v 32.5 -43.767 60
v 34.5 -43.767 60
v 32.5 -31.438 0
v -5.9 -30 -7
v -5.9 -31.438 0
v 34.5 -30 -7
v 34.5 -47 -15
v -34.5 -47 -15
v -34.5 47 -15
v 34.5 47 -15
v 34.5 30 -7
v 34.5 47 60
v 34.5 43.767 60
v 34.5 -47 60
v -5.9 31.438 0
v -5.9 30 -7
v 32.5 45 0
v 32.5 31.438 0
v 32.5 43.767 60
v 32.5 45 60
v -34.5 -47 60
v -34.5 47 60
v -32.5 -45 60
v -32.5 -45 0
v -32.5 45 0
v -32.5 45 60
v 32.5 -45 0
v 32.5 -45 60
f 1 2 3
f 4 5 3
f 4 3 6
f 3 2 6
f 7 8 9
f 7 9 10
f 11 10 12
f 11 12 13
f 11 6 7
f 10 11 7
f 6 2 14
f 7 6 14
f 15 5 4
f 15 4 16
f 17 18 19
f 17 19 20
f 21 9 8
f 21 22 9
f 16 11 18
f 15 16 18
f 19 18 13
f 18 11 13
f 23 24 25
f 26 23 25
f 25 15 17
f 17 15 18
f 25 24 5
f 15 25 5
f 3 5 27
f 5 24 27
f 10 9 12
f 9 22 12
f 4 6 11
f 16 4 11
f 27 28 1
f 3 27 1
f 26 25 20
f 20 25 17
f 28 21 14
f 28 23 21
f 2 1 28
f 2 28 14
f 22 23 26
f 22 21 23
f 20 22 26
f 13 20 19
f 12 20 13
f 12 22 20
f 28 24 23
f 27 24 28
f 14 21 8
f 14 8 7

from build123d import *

# Parameters (mm, degrees)
F0_W     = 69
F0_H     = 94
F0_W_2   = 65
F0_H_2   = 90
F1_DEPTH = 60
F2_W     = 69
F2_H     = 94
F3_DEPTH = 15
F5_DEPTH = 40.4


with BuildPart() as f1:
    # F0 (on Top) → F1 (new body)
    with BuildSketch(Plane.XY):
        Rectangle(F0_W, F0_H)
        Rectangle(F0_W_2, F0_H_2, mode=Mode.SUBTRACT)
    extrude(amount=F1_DEPTH)

    # F2 (on face) → F3 (join)
    with BuildSketch(Plane(origin=(0, 0, 0), x_dir=(1, 0, 0), z_dir=(0, 0, -1))):
        Rectangle(F2_W, F2_H)
    extrude(amount=F3_DEPTH)

    # F4 (on face) → F5 (cut)
    with BuildSketch(Plane.YZ.offset(34.5)):
        Polygon((-30, -7), (0, -7), (30, -7), (45, 66), (0, 66), (-45, 66), align=None)
    extrude(amount=-F5_DEPTH, mode=Mode.SUBTRACT)


solid = f1.part
